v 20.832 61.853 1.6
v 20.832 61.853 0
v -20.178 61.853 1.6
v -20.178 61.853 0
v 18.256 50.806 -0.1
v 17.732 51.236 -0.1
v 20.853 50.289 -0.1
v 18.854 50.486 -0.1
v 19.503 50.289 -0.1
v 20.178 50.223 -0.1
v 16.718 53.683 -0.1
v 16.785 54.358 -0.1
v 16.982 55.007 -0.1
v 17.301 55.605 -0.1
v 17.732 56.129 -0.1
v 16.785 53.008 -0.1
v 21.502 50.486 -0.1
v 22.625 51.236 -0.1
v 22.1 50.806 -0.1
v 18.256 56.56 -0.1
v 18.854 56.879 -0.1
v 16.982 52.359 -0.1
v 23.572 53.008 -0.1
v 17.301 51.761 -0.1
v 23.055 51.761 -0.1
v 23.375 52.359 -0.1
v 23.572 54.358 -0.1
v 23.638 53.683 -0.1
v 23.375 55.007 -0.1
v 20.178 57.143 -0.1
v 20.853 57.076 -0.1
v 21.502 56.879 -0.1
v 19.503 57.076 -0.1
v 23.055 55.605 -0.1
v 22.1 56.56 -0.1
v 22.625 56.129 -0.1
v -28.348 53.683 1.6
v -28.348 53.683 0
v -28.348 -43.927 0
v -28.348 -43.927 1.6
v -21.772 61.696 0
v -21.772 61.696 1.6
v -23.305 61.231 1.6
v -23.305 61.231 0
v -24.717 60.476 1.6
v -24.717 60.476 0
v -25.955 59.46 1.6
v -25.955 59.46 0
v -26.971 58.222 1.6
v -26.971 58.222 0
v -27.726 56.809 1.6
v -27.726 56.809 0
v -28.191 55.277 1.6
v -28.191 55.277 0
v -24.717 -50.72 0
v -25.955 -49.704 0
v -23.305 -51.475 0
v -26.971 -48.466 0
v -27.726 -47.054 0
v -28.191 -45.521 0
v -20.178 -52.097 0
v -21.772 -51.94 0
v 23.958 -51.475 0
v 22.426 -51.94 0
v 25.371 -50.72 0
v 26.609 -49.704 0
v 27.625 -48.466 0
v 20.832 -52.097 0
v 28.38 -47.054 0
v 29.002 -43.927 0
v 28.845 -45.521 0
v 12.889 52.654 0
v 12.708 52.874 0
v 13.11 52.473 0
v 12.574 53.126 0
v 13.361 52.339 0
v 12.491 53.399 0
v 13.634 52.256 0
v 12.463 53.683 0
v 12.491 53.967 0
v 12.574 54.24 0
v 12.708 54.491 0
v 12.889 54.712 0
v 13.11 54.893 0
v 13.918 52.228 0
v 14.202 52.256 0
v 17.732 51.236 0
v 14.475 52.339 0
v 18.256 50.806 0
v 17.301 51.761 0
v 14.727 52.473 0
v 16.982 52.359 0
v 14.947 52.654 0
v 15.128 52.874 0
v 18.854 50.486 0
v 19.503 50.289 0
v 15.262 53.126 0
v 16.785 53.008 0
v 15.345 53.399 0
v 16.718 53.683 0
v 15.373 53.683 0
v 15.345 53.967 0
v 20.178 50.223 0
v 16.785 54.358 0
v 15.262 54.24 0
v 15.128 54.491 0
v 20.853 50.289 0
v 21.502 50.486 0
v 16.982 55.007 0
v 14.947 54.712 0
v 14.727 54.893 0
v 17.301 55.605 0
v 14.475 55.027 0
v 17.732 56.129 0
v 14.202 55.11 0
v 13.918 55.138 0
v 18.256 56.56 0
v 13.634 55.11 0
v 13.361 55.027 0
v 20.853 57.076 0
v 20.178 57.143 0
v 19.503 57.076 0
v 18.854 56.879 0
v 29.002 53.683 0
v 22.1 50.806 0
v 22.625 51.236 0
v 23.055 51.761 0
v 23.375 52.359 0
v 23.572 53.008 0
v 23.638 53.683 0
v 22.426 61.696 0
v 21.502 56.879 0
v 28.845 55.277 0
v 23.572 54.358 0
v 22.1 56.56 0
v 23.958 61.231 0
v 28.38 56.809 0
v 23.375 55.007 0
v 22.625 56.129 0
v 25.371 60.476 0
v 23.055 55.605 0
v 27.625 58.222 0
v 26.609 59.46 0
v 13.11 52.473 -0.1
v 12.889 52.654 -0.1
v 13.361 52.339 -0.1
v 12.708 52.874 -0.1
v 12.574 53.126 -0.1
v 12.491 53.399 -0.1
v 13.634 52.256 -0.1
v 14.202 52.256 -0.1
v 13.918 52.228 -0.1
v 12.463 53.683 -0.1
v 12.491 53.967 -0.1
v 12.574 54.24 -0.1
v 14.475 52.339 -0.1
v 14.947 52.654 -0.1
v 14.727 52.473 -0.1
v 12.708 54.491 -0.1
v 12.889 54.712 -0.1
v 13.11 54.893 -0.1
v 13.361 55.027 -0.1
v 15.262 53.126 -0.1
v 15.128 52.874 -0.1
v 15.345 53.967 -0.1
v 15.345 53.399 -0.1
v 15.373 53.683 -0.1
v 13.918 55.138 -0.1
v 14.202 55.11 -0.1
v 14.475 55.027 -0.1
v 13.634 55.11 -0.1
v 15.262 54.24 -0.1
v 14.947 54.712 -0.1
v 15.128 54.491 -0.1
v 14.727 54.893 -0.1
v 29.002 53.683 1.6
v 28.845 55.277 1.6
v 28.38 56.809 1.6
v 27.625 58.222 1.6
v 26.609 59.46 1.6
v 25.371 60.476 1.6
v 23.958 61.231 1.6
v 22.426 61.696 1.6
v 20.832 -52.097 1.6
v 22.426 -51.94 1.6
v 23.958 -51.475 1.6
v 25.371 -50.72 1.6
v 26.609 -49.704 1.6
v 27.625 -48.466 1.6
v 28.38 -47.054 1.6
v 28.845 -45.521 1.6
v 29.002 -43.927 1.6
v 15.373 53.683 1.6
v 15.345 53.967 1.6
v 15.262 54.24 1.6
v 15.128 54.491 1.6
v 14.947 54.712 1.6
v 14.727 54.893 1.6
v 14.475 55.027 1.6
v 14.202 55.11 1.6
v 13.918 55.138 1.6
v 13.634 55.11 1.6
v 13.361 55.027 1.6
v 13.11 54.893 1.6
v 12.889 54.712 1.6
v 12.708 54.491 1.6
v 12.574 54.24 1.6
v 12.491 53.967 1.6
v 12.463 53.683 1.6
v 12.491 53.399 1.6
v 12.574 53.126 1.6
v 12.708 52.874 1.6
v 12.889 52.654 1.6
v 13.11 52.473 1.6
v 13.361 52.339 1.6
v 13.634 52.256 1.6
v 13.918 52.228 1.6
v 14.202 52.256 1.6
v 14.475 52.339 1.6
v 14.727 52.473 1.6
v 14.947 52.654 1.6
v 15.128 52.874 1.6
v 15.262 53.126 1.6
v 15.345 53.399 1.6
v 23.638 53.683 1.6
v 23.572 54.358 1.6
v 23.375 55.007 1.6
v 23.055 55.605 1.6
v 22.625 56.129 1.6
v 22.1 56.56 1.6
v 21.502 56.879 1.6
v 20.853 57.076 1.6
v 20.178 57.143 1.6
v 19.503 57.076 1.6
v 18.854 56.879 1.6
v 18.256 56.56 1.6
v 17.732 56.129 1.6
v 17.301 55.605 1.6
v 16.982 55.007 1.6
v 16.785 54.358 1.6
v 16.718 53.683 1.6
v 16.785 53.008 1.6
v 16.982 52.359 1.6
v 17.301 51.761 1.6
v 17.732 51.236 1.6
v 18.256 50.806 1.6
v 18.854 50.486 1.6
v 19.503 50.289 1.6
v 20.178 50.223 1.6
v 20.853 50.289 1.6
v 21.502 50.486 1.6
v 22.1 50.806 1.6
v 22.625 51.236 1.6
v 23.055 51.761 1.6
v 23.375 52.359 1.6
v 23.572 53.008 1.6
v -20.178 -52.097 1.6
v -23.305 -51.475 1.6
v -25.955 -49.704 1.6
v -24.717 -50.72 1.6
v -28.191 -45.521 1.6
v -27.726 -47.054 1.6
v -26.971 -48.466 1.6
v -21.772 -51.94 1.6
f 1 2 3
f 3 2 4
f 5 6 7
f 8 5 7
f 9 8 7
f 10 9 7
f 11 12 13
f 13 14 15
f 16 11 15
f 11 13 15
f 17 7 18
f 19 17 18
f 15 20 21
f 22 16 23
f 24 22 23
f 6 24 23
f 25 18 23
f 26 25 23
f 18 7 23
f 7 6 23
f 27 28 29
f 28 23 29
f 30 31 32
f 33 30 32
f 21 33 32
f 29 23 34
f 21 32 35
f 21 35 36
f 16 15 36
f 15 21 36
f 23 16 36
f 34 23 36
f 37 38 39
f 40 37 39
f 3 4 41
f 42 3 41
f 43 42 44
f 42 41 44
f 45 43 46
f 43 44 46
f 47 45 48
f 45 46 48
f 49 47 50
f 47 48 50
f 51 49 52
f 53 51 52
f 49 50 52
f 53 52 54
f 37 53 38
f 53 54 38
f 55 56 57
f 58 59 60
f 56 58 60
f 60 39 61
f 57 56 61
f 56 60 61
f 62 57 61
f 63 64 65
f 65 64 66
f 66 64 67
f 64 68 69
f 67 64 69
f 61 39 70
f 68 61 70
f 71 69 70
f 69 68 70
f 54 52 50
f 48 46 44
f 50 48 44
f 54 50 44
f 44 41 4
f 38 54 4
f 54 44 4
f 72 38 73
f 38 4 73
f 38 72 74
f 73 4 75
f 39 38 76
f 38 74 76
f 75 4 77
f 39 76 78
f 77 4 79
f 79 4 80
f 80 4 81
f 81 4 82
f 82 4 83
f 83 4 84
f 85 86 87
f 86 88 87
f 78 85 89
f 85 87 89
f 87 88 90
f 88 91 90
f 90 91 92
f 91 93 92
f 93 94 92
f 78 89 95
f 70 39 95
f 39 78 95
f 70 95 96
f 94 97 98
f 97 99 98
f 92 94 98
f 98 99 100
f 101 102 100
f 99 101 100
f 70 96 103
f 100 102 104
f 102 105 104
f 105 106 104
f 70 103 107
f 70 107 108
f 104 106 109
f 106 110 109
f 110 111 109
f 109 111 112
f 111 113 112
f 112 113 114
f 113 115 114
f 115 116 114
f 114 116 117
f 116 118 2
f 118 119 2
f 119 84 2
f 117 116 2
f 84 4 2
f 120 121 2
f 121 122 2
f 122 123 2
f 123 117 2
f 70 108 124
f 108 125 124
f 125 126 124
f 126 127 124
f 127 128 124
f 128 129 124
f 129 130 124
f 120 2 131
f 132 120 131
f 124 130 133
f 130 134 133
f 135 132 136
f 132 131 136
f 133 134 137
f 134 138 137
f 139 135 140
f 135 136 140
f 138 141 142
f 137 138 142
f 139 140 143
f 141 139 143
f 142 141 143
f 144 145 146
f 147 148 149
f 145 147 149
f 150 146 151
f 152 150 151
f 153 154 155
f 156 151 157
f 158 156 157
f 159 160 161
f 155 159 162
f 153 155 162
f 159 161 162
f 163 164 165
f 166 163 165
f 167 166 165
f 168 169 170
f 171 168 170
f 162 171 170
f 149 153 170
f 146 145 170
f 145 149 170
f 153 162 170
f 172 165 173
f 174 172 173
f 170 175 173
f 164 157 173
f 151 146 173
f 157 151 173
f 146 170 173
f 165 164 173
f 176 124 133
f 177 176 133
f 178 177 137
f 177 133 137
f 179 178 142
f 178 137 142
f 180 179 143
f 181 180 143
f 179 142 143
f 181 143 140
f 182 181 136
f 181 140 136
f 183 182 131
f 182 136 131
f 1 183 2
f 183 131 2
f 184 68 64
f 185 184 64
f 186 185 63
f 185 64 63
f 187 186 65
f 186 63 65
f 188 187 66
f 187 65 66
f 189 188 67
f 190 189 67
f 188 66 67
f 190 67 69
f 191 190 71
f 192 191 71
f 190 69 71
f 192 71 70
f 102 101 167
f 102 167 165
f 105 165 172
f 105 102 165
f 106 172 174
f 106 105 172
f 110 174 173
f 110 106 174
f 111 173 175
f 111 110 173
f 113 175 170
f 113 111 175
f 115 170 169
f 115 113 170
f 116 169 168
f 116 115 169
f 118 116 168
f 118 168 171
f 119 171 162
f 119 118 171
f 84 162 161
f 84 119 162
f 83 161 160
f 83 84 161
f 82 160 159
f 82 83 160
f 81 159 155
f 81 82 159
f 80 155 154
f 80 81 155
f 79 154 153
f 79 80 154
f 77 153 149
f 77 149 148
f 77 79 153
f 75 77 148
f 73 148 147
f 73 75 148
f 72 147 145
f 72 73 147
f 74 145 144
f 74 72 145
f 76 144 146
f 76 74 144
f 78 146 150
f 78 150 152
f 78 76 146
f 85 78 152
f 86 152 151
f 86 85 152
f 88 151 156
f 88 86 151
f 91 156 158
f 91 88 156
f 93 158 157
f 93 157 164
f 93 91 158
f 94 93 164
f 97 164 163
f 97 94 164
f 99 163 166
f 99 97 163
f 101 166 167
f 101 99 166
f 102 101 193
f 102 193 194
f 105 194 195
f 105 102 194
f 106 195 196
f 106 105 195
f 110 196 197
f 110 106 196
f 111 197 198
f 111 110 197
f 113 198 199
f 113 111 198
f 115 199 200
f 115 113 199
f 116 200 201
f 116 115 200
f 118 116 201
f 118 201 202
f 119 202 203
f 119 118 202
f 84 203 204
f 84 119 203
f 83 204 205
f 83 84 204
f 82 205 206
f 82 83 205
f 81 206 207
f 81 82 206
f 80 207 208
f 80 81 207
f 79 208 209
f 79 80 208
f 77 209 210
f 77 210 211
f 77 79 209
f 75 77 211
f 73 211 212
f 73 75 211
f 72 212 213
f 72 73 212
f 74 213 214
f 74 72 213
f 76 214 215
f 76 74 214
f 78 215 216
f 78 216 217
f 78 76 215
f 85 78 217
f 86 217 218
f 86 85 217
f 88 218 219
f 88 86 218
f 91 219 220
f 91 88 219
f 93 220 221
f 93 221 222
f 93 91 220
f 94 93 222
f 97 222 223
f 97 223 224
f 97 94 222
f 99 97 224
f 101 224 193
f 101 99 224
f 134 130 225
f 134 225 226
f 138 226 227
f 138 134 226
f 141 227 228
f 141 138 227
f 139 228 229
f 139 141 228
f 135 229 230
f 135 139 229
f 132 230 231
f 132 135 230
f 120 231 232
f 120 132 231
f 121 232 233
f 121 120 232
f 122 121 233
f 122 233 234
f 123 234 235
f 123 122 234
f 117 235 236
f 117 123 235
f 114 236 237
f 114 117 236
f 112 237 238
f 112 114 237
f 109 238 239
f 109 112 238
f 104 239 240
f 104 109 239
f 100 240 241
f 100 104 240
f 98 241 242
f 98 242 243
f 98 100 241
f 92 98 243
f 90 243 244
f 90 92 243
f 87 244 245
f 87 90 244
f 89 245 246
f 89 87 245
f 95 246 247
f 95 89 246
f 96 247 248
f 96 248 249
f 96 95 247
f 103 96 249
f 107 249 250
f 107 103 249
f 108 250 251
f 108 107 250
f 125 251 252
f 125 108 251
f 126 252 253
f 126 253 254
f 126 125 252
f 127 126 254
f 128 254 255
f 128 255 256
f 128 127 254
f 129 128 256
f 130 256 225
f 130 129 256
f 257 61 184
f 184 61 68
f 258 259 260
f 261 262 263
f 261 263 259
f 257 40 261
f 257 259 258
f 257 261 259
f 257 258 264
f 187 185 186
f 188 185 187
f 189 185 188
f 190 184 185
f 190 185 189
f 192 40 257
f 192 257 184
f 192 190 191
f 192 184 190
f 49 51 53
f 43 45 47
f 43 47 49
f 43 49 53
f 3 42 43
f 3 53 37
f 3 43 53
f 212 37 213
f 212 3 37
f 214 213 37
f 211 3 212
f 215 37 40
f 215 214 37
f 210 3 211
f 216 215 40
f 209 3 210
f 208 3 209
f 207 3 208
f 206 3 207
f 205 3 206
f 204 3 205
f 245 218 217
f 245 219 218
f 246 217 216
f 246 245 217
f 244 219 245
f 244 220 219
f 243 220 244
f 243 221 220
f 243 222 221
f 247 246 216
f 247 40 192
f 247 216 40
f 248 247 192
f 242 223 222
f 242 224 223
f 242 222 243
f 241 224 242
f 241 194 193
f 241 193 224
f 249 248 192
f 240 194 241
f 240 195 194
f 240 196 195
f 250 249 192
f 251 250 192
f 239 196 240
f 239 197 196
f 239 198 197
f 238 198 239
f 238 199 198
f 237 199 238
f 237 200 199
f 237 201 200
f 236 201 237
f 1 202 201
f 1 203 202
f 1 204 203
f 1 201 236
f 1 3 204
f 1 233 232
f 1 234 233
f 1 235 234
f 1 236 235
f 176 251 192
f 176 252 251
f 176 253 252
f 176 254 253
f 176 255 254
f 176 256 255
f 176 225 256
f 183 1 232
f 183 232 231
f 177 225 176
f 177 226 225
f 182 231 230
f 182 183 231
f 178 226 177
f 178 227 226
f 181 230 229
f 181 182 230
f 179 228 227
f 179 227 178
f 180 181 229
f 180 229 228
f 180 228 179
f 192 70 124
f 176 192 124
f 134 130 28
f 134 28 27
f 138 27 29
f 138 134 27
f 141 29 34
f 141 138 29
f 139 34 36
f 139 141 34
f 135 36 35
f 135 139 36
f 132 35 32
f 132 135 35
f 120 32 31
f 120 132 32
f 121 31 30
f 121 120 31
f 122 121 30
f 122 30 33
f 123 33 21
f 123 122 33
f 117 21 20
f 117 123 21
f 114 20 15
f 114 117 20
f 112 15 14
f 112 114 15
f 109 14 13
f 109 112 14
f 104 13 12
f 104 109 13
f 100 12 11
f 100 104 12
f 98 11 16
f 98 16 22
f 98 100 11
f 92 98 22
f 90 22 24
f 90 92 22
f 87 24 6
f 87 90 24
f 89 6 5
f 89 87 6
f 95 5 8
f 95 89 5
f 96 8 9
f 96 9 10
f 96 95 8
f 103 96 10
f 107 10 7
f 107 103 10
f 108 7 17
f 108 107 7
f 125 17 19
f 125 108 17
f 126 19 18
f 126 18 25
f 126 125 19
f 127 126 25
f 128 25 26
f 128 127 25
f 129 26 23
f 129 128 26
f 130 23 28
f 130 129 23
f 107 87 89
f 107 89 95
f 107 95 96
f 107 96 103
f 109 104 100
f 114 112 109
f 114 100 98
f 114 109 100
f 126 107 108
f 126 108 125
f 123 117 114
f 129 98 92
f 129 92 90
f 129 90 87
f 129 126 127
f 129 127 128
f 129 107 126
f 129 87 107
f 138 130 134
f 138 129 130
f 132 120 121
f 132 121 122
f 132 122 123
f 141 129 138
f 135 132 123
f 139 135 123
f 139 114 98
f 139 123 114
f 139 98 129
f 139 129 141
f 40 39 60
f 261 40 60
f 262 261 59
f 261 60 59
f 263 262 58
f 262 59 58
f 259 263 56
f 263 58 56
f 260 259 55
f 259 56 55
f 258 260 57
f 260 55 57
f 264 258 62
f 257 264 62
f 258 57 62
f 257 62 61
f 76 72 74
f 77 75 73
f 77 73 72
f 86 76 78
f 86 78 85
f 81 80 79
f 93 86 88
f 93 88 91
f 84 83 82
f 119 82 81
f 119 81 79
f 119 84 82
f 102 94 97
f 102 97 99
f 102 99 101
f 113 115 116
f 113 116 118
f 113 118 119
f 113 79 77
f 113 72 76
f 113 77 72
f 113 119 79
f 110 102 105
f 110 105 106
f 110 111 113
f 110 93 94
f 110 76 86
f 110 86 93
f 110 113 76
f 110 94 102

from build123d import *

# Parameters (mm, degrees)
F0_R     = 1.455
F0_R_2   = 3.46
F1_DEPTH = 1.6
F2_DEPTH = 0.1
F3_DEPTH = 0.1


with BuildPart() as f1:
    # F0 (on Top) → F1 (new body)
    with BuildSketch(Plane.XY):
        with BuildLine():
            Line((20.831838, 61.852799), (-20.178162, 61.852799))
            ThreePointArc((-20.178162, 61.852799), (-25.955224, 59.459861), (-28.348162, 53.682799))
            Line((-28.348162, 53.682799), (-28.348162, -43.927201))
            ThreePointArc((-28.348162, -43.927201), (-25.955224, -49.704264), (-20.178162, -52.097201))
            Line((-20.178162, -52.097201), (20.831838, -52.097201))
            ThreePointArc((20.831838, -52.097201), (26.608901, -49.704264), (29.001838, -43.927201))
            Line((29.001838, -43.927201), (29.001838, 53.682799))
            ThreePointArc((29.001838, 53.682799), (26.608901, 59.459861), (20.831838, 61.852799))
        make_face()
        with Locations((13.918162, 53.682799)):
            Circle(F0_R, mode=Mode.SUBTRACT)
        with Locations((20.178162, 53.682799)):
            Circle(F0_R_2, mode=Mode.SUBTRACT)
    extrude(amount=F1_DEPTH)

    # F0 (on Top) → F2 (join)
    with BuildSketch(Plane.XY):
        with Locations((20.178162, 53.682799)):
            Circle(F0_R_2)
    extrude(amount=-F2_DEPTH)


with BuildPart() as f3:
    # F0 (on Top) → F3 (new body)
    with BuildSketch(Plane.XY):
        with Locations((13.918162, 53.682799)):
            Circle(F0_R)
    extrude(amount=-F3_DEPTH)


solid = Compound([f1.part, f3.part])
